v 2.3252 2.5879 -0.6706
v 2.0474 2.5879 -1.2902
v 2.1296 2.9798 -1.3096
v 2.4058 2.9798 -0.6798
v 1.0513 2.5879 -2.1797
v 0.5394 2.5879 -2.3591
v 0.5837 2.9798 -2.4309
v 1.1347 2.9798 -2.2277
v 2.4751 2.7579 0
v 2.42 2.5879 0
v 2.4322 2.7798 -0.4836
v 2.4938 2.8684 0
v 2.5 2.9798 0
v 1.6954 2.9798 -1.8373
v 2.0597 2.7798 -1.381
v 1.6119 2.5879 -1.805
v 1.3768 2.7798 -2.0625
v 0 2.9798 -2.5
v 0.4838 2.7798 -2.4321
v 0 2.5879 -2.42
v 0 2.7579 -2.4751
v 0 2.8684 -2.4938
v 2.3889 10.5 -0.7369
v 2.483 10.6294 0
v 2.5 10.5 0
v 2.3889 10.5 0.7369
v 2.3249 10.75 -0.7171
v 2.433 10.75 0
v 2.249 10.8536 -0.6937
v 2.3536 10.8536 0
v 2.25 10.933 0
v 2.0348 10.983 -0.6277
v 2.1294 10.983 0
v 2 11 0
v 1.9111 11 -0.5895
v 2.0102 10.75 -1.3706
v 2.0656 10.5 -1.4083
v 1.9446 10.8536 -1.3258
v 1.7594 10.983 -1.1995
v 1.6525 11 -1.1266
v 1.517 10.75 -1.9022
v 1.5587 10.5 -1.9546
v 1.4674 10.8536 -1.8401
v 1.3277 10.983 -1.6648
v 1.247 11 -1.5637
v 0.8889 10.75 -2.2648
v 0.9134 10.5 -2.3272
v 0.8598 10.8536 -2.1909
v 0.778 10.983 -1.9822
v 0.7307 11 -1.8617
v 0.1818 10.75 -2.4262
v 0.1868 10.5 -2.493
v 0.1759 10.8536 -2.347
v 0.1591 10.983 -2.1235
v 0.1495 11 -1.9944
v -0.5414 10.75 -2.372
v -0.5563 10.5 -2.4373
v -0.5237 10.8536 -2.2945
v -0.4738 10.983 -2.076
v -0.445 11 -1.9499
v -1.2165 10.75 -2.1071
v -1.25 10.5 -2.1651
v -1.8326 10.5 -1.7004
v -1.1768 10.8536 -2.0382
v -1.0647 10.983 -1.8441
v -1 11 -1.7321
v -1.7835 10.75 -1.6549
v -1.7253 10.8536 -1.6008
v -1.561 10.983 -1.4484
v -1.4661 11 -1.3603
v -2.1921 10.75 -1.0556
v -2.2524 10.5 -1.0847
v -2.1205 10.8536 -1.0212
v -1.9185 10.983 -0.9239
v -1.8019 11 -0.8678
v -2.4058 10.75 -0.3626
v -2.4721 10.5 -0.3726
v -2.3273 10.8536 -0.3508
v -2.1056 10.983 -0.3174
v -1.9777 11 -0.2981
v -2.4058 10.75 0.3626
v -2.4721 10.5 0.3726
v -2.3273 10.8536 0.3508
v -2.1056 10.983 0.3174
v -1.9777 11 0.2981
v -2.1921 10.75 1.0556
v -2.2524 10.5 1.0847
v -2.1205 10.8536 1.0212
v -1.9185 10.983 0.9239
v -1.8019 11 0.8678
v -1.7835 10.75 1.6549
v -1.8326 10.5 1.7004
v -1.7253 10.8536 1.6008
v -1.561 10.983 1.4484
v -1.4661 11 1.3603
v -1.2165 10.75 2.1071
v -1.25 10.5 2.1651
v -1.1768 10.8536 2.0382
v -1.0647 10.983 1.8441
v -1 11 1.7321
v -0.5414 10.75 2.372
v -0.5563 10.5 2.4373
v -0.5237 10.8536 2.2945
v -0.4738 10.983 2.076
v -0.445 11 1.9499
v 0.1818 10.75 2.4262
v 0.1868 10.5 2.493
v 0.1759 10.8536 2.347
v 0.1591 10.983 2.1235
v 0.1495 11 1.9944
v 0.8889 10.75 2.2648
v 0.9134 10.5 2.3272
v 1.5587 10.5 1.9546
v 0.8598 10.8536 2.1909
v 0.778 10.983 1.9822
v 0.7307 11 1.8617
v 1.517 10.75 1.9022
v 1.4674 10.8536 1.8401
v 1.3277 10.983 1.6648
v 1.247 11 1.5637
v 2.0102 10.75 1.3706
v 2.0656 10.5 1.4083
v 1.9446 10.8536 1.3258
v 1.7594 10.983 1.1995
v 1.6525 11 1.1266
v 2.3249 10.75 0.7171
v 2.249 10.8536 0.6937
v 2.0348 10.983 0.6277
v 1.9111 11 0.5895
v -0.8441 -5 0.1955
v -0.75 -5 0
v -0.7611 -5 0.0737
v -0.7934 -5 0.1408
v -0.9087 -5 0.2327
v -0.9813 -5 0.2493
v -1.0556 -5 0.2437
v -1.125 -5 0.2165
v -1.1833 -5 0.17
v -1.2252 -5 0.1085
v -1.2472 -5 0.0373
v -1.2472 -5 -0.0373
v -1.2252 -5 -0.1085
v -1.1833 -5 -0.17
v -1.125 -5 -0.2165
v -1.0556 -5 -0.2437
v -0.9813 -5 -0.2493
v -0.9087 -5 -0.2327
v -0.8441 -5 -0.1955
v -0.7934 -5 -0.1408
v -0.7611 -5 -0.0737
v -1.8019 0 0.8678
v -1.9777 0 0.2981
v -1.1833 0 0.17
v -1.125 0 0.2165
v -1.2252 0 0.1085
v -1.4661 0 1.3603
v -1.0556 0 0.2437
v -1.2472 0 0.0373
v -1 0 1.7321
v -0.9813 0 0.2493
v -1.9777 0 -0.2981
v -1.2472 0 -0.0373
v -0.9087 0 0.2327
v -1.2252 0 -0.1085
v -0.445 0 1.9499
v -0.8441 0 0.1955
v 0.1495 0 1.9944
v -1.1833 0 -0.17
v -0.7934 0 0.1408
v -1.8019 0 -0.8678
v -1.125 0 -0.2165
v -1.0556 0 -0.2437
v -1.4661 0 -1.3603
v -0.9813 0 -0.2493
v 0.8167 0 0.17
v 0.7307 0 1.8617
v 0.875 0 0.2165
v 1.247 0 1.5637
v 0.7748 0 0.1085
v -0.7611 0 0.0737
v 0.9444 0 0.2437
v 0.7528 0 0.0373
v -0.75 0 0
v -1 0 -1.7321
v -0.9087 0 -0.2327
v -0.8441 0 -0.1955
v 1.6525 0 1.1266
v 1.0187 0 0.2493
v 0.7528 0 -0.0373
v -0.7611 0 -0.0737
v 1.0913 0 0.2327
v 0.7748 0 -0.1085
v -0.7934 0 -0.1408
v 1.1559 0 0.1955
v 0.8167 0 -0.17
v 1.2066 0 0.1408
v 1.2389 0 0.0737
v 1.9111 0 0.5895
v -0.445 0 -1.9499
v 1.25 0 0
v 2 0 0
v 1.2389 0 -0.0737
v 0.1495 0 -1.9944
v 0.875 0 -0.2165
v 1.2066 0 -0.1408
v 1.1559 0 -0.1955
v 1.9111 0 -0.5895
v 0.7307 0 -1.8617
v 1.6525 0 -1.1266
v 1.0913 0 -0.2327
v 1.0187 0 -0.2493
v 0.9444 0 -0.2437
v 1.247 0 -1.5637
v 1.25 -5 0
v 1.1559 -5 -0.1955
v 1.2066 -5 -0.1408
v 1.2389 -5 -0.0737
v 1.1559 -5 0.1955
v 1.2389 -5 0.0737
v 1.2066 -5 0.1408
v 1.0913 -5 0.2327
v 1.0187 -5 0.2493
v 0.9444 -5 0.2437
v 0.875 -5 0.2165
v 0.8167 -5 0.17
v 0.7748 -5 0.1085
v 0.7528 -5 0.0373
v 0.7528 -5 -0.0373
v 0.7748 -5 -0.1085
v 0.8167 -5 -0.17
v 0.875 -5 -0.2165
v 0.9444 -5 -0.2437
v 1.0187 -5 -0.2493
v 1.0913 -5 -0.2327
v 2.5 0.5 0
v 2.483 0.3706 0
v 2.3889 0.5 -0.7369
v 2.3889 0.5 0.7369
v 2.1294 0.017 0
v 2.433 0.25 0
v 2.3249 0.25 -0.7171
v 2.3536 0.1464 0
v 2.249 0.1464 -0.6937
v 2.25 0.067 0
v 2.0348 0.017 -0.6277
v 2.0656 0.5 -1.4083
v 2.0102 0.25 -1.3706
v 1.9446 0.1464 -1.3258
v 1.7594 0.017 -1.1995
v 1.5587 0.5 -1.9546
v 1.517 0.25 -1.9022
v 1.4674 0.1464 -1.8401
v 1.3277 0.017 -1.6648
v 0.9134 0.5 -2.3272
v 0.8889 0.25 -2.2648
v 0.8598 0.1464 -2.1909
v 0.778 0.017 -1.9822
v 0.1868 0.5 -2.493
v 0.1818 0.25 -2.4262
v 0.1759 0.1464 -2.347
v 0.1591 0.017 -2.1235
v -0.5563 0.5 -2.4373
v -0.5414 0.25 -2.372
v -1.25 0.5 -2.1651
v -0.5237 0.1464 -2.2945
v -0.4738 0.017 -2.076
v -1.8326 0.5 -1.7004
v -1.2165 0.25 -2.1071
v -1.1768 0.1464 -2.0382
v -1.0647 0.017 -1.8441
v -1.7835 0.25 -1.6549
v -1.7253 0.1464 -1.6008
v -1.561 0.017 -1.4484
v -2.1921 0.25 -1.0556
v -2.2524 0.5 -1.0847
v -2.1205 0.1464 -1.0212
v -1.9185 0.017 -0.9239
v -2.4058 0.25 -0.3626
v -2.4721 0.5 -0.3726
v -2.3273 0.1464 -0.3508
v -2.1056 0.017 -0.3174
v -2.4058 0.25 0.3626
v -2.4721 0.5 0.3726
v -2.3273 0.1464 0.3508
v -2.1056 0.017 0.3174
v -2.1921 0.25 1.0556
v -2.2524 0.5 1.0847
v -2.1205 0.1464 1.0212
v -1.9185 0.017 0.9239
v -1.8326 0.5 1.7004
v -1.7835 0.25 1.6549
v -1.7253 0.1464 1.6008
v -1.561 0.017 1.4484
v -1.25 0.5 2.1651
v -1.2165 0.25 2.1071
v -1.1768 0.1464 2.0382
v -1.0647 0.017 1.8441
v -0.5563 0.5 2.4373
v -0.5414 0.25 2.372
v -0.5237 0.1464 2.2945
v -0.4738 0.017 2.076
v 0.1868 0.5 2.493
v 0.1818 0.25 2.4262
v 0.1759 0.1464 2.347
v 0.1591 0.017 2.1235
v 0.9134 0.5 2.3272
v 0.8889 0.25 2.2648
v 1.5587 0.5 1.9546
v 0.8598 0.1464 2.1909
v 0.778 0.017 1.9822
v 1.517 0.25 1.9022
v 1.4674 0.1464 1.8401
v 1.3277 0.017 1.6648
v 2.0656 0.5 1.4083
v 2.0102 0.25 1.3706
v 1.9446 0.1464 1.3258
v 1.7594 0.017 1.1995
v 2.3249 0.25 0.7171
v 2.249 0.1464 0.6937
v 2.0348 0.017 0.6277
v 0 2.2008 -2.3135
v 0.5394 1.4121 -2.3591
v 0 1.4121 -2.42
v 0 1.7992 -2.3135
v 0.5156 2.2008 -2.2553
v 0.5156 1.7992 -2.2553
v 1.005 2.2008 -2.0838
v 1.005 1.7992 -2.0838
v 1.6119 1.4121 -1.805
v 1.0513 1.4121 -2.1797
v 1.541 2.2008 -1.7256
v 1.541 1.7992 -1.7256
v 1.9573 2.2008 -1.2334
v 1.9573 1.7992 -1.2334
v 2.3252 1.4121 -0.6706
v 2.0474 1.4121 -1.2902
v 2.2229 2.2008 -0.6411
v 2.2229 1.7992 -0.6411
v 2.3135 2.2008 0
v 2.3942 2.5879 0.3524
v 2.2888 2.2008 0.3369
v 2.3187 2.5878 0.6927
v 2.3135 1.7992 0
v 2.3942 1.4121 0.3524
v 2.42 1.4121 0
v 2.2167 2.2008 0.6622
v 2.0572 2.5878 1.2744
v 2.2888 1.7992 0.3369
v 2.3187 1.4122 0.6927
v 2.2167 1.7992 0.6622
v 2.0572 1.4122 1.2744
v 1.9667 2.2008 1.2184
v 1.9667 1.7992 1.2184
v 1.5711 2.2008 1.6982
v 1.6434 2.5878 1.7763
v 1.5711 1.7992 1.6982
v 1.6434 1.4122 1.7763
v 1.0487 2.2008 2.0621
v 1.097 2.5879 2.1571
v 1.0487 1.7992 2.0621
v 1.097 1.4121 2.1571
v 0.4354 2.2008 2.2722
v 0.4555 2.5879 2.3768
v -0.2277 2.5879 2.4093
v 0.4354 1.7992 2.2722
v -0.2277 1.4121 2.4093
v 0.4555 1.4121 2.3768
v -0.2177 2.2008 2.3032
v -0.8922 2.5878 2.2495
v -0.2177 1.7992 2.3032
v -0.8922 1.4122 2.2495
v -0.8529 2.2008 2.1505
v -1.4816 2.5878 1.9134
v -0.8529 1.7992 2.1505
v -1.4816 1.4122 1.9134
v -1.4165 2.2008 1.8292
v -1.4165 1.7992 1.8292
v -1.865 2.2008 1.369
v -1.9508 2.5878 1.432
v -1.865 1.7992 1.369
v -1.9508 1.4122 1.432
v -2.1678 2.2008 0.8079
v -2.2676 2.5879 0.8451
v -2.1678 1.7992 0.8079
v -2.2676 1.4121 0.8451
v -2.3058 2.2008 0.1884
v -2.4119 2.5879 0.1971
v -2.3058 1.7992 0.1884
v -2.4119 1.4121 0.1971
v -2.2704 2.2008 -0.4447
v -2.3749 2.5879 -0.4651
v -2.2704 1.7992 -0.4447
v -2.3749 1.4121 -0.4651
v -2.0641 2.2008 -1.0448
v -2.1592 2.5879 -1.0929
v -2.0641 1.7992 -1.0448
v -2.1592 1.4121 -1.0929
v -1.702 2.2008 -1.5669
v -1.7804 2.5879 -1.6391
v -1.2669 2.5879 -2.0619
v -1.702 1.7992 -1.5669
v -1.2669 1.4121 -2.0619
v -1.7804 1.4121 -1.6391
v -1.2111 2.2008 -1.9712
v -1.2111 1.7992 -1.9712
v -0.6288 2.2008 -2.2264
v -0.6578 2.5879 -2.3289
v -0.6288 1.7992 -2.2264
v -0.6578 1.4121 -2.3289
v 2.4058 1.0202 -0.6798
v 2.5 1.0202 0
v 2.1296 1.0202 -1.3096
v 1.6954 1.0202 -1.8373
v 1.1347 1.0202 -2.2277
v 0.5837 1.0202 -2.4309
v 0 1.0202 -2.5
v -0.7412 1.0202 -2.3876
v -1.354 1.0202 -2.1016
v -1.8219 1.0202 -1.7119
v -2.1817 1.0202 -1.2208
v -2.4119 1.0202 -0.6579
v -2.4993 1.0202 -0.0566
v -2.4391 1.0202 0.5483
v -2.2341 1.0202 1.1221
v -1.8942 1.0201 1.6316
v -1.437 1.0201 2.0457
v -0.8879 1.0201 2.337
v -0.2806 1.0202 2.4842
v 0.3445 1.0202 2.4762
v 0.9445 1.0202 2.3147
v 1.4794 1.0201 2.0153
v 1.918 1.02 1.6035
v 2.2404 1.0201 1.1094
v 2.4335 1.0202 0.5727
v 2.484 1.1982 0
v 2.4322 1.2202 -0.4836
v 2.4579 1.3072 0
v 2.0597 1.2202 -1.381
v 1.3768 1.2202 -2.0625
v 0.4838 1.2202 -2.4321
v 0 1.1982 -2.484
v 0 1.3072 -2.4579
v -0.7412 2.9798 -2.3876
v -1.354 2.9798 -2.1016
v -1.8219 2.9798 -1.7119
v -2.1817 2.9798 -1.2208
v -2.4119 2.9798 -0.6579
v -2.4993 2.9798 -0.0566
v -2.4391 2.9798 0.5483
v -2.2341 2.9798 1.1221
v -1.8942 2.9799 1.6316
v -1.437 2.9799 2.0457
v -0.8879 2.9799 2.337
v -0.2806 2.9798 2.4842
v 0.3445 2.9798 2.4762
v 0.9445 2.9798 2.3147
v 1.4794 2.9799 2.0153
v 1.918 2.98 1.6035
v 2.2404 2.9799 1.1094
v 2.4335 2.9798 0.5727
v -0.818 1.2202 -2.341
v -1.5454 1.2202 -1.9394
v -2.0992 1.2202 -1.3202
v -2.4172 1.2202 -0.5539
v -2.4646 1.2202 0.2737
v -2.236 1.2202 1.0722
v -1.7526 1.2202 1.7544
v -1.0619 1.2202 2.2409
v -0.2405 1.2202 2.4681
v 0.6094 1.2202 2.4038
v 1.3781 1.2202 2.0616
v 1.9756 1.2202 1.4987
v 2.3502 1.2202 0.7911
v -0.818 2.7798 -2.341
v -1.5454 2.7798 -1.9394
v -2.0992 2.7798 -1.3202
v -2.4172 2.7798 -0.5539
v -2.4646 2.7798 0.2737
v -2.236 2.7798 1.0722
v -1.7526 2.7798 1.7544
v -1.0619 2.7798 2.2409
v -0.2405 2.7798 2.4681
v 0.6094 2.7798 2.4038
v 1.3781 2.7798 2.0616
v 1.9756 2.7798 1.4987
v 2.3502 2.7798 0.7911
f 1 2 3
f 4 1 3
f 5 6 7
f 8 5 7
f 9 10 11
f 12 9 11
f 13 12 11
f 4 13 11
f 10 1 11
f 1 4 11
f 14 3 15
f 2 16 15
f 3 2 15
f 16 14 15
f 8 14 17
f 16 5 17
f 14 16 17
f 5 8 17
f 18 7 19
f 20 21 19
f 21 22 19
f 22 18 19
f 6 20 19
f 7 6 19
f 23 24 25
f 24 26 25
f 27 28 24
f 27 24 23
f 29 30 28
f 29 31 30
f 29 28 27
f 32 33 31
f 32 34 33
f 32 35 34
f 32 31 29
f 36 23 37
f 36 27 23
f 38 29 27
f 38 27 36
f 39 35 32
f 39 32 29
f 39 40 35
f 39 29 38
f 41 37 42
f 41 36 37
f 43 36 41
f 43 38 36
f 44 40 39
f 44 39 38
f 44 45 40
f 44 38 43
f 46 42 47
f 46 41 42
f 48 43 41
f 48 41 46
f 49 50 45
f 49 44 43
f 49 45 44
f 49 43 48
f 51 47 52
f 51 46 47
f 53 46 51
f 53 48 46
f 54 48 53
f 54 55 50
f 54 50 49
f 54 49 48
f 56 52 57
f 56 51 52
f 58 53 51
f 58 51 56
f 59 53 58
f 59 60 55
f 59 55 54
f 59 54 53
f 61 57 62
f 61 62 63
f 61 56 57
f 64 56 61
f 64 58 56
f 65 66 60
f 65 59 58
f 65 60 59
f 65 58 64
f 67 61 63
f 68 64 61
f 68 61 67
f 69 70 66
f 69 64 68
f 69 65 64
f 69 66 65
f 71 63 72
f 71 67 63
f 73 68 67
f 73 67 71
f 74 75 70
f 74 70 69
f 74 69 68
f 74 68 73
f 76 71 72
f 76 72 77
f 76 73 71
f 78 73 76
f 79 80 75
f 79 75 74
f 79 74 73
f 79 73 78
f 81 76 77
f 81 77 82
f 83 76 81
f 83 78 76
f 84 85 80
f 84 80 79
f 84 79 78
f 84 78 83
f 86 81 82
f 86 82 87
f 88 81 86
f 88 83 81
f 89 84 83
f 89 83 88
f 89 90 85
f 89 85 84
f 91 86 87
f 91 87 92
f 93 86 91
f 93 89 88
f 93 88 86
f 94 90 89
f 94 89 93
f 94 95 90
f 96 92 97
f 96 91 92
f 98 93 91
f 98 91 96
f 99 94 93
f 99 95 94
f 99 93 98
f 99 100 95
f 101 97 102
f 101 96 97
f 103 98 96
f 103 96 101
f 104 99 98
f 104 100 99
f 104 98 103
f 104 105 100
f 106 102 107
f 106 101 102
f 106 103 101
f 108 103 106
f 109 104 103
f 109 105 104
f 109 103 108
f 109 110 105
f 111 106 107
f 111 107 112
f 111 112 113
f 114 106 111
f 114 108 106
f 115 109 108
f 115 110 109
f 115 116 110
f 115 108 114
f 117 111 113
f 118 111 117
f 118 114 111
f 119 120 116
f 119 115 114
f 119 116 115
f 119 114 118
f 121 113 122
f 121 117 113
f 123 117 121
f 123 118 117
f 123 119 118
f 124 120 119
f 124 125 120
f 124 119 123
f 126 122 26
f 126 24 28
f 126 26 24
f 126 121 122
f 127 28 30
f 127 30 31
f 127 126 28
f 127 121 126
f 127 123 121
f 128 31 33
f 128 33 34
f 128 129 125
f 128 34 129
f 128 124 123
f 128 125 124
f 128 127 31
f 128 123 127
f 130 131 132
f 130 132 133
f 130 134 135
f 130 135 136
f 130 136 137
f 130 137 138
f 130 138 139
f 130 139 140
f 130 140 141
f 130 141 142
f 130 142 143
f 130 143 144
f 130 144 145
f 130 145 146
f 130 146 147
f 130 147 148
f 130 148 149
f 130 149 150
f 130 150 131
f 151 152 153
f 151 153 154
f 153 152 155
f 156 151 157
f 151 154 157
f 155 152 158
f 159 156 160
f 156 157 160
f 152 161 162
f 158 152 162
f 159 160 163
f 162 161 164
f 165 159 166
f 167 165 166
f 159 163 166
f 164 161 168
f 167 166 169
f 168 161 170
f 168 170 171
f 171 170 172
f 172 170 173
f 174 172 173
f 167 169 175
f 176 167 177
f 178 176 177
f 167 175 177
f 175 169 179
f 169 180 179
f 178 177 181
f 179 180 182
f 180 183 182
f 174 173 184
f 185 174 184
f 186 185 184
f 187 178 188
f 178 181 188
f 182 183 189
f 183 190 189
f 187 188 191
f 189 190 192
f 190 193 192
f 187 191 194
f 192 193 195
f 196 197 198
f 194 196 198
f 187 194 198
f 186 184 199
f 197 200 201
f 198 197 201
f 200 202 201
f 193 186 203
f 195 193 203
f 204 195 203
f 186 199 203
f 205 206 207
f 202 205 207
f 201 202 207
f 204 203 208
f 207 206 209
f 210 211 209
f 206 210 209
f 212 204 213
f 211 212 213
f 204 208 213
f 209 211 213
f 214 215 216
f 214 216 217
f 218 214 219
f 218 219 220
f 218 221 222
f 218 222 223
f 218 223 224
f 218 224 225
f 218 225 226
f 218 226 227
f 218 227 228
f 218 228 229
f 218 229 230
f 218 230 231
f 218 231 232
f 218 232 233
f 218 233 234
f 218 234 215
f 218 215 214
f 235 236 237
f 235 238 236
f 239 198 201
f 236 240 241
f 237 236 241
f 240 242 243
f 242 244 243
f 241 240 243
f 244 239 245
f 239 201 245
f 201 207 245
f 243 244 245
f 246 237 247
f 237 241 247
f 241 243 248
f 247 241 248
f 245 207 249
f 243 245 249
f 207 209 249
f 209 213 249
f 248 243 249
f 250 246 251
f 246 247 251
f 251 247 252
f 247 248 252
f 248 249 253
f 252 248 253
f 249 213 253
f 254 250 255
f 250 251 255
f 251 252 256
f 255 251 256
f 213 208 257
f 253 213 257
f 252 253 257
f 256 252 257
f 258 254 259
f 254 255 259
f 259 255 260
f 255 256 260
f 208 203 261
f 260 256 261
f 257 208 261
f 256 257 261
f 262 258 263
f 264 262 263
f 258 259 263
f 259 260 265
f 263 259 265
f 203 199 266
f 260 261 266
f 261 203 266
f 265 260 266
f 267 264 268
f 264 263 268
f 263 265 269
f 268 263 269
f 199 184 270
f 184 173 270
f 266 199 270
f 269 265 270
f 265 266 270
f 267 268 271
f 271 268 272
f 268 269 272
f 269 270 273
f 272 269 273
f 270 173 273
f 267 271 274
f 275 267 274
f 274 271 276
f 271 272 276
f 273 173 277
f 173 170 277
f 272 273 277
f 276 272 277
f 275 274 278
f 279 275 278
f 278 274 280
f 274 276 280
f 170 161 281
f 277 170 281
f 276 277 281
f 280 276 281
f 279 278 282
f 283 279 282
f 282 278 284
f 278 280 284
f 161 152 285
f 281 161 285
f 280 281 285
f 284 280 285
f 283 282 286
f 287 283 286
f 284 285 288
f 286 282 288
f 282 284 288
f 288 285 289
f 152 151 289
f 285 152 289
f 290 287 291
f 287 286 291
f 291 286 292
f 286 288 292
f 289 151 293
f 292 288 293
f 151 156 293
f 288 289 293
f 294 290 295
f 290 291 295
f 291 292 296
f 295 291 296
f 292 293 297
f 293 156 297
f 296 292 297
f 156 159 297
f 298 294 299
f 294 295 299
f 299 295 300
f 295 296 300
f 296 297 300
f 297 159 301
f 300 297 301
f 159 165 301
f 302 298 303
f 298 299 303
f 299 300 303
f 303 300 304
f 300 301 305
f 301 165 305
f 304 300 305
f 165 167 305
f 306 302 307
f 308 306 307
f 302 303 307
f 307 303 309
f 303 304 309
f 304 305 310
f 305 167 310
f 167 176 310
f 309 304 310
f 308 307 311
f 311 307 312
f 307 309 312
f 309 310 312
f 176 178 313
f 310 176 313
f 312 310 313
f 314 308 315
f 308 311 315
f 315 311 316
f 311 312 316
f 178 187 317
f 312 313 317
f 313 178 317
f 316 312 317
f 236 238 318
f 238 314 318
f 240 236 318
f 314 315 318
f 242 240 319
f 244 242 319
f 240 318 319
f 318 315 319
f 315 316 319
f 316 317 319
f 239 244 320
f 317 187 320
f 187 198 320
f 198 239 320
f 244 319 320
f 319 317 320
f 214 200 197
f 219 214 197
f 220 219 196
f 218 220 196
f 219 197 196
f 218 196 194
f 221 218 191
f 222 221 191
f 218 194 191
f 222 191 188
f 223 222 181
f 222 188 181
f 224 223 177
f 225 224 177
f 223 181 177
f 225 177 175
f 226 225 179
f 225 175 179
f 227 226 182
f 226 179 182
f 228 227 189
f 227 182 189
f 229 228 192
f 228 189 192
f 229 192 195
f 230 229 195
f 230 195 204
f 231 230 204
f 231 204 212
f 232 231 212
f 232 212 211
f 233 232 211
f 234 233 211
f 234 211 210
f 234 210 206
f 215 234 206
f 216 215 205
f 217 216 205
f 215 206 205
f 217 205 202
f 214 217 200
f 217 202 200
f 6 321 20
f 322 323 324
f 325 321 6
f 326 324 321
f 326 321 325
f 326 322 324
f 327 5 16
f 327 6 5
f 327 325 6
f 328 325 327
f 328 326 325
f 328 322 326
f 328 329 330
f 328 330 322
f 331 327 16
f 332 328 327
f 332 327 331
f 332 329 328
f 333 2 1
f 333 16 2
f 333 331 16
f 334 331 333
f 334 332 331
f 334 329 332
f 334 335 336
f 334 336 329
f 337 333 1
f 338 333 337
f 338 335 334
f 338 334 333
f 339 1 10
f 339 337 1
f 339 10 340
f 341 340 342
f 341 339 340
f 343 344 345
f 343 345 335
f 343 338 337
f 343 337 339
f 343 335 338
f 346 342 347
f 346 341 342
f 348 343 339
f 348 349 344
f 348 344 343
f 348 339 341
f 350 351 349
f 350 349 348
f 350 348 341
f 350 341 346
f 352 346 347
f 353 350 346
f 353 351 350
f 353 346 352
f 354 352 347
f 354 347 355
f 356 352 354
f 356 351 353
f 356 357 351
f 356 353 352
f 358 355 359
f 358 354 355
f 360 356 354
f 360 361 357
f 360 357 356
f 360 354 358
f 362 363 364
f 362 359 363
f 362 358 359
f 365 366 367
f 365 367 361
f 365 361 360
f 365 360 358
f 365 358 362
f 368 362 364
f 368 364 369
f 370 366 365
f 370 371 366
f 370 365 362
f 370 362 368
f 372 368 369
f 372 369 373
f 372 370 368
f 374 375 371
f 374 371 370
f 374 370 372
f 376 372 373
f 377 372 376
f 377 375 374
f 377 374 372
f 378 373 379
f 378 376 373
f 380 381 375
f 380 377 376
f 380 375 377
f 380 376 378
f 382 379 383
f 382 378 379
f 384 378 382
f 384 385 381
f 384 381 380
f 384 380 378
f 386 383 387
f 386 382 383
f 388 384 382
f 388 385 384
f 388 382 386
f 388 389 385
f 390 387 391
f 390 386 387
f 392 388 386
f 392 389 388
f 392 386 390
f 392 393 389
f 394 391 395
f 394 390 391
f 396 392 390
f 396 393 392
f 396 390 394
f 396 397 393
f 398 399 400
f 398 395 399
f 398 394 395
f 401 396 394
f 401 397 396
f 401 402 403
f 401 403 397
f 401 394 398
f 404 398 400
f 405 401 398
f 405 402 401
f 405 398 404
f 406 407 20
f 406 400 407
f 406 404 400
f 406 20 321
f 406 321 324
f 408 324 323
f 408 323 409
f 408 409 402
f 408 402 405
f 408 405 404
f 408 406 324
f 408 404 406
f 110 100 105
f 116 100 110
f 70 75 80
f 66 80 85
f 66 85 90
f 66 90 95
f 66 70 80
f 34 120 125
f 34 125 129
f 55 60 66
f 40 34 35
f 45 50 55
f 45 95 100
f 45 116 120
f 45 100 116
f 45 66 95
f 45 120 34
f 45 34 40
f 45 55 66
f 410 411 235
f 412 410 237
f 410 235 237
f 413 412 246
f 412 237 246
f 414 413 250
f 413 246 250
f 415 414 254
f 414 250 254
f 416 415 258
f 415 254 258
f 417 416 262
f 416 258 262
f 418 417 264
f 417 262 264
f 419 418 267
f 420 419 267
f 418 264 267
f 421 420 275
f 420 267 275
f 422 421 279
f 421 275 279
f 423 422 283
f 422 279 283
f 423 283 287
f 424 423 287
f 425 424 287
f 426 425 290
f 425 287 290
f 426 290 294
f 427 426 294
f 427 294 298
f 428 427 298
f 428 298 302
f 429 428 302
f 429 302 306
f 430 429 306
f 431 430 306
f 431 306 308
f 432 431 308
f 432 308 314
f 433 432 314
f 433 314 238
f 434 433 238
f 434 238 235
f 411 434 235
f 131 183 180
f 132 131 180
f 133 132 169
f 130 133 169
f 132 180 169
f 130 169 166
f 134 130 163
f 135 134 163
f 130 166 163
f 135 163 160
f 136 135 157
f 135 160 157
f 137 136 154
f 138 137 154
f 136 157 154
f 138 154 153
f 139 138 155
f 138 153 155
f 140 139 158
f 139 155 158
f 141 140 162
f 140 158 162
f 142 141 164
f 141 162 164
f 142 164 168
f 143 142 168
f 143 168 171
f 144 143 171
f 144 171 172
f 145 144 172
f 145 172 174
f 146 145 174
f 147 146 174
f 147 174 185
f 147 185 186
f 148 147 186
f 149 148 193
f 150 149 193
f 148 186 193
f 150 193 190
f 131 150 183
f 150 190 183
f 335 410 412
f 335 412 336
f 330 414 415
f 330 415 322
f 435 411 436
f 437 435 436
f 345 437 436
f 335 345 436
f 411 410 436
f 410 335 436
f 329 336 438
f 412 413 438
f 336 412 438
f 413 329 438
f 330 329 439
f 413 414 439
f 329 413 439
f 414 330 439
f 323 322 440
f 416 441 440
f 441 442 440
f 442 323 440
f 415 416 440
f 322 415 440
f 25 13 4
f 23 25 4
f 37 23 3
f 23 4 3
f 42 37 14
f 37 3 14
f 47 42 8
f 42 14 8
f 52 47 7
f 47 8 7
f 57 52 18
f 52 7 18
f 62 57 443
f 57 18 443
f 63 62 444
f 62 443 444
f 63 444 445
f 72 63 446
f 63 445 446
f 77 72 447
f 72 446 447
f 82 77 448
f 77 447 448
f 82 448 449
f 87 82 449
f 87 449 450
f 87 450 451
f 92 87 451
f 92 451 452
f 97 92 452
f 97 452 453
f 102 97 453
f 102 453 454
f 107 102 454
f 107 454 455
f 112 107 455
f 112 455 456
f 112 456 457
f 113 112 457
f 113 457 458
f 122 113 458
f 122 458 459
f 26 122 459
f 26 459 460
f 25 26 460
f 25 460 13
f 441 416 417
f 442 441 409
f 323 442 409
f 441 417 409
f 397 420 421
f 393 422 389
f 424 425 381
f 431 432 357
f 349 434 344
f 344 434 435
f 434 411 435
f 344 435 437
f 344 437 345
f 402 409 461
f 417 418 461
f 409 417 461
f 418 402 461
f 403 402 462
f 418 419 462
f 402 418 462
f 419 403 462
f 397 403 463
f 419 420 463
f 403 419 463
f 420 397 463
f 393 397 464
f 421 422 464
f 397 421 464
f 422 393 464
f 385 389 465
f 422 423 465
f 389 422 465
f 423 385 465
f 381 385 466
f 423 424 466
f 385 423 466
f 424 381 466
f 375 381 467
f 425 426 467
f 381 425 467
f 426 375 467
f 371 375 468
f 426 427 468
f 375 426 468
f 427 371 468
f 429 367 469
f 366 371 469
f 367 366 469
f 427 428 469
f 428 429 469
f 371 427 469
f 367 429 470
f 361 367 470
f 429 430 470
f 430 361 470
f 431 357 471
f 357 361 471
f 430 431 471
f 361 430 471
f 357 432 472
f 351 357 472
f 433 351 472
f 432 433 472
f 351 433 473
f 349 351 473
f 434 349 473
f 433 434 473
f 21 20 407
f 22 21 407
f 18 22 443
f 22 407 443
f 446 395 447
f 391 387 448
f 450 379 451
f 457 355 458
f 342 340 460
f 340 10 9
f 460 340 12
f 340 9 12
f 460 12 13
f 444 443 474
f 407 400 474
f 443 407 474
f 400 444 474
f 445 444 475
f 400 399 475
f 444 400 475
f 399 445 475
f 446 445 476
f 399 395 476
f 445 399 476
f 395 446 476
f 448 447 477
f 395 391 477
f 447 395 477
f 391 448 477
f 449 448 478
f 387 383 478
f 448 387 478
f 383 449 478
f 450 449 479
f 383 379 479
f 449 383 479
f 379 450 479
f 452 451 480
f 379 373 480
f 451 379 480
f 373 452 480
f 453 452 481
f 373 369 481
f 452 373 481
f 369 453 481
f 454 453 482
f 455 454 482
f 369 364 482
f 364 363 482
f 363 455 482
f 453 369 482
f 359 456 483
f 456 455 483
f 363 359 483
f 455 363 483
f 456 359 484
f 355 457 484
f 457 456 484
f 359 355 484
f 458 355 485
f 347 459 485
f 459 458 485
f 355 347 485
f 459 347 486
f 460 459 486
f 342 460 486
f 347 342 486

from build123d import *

# Parameters (mm, degrees)
SKETCH1_R           = 2.5
BOSS_EXTRUDE1_DEPTH = 11
SKETCH2_R           = 0.25
BOSS_EXTRUDE2_DEPTH = 5
SKETCH3_R           = 1.5
FILLET1_R           = 1
FILLET2_R           = 0.5
FILLET3_R           = 0.5


with BuildPart() as part:
    # Sketch1 → Boss-Extrude1 (new body)
    with BuildSketch(Plane(origin=(0, 0, 0), x_dir=(1, 0, 0), z_dir=(0, 1, 0))):
        Circle(SKETCH1_R)
    extrude(amount=BOSS_EXTRUDE1_DEPTH)

    # Sketch2 → Boss-Extrude2 (add)
    with BuildSketch(Plane.XZ):
        with Locations((1, 0)):
            Circle(SKETCH2_R)
        with Locations((-1, 0)):
            Circle(SKETCH2_R)
    extrude(amount=BOSS_EXTRUDE2_DEPTH)

    # Sketch3 → Cut-Revolve1 (revolve, cut)
    with BuildSketch(Plane(origin=(0, 0, 0), x_dir=(0, 0, -1), z_dir=(1, 0, 0))):
        with Locations((3.8, 2)):
            Circle(SKETCH3_R)
    revolve(axis=Axis((0, 21.78154861, 0), (0, -1, 0)), mode=Mode.SUBTRACT)

    # Fillet1
    fillet1_edges = [part.edges().sort_by_distance(p)[0] for p in [
        (-1.767766953, 2.748331477, 1.767766953),
        (-1.767766953, 1.251668523, 1.767766953),
    ]]
    fillet(fillet1_edges, radius=FILLET1_R)

    # Fillet2
    fillet2_edges = [part.edges().sort_by_distance(p)[0] for p in [
        (-2.5, 11, 0),
    ]]
    fillet(fillet2_edges, radius=FILLET2_R)

    # Fillet3
    fillet3_edges = [part.edges().sort_by_distance(p)[0] for p in [
        (-2.5, 0, 0),
    ]]
    fillet(fillet3_edges, radius=FILLET3_R)


solid = part.part
